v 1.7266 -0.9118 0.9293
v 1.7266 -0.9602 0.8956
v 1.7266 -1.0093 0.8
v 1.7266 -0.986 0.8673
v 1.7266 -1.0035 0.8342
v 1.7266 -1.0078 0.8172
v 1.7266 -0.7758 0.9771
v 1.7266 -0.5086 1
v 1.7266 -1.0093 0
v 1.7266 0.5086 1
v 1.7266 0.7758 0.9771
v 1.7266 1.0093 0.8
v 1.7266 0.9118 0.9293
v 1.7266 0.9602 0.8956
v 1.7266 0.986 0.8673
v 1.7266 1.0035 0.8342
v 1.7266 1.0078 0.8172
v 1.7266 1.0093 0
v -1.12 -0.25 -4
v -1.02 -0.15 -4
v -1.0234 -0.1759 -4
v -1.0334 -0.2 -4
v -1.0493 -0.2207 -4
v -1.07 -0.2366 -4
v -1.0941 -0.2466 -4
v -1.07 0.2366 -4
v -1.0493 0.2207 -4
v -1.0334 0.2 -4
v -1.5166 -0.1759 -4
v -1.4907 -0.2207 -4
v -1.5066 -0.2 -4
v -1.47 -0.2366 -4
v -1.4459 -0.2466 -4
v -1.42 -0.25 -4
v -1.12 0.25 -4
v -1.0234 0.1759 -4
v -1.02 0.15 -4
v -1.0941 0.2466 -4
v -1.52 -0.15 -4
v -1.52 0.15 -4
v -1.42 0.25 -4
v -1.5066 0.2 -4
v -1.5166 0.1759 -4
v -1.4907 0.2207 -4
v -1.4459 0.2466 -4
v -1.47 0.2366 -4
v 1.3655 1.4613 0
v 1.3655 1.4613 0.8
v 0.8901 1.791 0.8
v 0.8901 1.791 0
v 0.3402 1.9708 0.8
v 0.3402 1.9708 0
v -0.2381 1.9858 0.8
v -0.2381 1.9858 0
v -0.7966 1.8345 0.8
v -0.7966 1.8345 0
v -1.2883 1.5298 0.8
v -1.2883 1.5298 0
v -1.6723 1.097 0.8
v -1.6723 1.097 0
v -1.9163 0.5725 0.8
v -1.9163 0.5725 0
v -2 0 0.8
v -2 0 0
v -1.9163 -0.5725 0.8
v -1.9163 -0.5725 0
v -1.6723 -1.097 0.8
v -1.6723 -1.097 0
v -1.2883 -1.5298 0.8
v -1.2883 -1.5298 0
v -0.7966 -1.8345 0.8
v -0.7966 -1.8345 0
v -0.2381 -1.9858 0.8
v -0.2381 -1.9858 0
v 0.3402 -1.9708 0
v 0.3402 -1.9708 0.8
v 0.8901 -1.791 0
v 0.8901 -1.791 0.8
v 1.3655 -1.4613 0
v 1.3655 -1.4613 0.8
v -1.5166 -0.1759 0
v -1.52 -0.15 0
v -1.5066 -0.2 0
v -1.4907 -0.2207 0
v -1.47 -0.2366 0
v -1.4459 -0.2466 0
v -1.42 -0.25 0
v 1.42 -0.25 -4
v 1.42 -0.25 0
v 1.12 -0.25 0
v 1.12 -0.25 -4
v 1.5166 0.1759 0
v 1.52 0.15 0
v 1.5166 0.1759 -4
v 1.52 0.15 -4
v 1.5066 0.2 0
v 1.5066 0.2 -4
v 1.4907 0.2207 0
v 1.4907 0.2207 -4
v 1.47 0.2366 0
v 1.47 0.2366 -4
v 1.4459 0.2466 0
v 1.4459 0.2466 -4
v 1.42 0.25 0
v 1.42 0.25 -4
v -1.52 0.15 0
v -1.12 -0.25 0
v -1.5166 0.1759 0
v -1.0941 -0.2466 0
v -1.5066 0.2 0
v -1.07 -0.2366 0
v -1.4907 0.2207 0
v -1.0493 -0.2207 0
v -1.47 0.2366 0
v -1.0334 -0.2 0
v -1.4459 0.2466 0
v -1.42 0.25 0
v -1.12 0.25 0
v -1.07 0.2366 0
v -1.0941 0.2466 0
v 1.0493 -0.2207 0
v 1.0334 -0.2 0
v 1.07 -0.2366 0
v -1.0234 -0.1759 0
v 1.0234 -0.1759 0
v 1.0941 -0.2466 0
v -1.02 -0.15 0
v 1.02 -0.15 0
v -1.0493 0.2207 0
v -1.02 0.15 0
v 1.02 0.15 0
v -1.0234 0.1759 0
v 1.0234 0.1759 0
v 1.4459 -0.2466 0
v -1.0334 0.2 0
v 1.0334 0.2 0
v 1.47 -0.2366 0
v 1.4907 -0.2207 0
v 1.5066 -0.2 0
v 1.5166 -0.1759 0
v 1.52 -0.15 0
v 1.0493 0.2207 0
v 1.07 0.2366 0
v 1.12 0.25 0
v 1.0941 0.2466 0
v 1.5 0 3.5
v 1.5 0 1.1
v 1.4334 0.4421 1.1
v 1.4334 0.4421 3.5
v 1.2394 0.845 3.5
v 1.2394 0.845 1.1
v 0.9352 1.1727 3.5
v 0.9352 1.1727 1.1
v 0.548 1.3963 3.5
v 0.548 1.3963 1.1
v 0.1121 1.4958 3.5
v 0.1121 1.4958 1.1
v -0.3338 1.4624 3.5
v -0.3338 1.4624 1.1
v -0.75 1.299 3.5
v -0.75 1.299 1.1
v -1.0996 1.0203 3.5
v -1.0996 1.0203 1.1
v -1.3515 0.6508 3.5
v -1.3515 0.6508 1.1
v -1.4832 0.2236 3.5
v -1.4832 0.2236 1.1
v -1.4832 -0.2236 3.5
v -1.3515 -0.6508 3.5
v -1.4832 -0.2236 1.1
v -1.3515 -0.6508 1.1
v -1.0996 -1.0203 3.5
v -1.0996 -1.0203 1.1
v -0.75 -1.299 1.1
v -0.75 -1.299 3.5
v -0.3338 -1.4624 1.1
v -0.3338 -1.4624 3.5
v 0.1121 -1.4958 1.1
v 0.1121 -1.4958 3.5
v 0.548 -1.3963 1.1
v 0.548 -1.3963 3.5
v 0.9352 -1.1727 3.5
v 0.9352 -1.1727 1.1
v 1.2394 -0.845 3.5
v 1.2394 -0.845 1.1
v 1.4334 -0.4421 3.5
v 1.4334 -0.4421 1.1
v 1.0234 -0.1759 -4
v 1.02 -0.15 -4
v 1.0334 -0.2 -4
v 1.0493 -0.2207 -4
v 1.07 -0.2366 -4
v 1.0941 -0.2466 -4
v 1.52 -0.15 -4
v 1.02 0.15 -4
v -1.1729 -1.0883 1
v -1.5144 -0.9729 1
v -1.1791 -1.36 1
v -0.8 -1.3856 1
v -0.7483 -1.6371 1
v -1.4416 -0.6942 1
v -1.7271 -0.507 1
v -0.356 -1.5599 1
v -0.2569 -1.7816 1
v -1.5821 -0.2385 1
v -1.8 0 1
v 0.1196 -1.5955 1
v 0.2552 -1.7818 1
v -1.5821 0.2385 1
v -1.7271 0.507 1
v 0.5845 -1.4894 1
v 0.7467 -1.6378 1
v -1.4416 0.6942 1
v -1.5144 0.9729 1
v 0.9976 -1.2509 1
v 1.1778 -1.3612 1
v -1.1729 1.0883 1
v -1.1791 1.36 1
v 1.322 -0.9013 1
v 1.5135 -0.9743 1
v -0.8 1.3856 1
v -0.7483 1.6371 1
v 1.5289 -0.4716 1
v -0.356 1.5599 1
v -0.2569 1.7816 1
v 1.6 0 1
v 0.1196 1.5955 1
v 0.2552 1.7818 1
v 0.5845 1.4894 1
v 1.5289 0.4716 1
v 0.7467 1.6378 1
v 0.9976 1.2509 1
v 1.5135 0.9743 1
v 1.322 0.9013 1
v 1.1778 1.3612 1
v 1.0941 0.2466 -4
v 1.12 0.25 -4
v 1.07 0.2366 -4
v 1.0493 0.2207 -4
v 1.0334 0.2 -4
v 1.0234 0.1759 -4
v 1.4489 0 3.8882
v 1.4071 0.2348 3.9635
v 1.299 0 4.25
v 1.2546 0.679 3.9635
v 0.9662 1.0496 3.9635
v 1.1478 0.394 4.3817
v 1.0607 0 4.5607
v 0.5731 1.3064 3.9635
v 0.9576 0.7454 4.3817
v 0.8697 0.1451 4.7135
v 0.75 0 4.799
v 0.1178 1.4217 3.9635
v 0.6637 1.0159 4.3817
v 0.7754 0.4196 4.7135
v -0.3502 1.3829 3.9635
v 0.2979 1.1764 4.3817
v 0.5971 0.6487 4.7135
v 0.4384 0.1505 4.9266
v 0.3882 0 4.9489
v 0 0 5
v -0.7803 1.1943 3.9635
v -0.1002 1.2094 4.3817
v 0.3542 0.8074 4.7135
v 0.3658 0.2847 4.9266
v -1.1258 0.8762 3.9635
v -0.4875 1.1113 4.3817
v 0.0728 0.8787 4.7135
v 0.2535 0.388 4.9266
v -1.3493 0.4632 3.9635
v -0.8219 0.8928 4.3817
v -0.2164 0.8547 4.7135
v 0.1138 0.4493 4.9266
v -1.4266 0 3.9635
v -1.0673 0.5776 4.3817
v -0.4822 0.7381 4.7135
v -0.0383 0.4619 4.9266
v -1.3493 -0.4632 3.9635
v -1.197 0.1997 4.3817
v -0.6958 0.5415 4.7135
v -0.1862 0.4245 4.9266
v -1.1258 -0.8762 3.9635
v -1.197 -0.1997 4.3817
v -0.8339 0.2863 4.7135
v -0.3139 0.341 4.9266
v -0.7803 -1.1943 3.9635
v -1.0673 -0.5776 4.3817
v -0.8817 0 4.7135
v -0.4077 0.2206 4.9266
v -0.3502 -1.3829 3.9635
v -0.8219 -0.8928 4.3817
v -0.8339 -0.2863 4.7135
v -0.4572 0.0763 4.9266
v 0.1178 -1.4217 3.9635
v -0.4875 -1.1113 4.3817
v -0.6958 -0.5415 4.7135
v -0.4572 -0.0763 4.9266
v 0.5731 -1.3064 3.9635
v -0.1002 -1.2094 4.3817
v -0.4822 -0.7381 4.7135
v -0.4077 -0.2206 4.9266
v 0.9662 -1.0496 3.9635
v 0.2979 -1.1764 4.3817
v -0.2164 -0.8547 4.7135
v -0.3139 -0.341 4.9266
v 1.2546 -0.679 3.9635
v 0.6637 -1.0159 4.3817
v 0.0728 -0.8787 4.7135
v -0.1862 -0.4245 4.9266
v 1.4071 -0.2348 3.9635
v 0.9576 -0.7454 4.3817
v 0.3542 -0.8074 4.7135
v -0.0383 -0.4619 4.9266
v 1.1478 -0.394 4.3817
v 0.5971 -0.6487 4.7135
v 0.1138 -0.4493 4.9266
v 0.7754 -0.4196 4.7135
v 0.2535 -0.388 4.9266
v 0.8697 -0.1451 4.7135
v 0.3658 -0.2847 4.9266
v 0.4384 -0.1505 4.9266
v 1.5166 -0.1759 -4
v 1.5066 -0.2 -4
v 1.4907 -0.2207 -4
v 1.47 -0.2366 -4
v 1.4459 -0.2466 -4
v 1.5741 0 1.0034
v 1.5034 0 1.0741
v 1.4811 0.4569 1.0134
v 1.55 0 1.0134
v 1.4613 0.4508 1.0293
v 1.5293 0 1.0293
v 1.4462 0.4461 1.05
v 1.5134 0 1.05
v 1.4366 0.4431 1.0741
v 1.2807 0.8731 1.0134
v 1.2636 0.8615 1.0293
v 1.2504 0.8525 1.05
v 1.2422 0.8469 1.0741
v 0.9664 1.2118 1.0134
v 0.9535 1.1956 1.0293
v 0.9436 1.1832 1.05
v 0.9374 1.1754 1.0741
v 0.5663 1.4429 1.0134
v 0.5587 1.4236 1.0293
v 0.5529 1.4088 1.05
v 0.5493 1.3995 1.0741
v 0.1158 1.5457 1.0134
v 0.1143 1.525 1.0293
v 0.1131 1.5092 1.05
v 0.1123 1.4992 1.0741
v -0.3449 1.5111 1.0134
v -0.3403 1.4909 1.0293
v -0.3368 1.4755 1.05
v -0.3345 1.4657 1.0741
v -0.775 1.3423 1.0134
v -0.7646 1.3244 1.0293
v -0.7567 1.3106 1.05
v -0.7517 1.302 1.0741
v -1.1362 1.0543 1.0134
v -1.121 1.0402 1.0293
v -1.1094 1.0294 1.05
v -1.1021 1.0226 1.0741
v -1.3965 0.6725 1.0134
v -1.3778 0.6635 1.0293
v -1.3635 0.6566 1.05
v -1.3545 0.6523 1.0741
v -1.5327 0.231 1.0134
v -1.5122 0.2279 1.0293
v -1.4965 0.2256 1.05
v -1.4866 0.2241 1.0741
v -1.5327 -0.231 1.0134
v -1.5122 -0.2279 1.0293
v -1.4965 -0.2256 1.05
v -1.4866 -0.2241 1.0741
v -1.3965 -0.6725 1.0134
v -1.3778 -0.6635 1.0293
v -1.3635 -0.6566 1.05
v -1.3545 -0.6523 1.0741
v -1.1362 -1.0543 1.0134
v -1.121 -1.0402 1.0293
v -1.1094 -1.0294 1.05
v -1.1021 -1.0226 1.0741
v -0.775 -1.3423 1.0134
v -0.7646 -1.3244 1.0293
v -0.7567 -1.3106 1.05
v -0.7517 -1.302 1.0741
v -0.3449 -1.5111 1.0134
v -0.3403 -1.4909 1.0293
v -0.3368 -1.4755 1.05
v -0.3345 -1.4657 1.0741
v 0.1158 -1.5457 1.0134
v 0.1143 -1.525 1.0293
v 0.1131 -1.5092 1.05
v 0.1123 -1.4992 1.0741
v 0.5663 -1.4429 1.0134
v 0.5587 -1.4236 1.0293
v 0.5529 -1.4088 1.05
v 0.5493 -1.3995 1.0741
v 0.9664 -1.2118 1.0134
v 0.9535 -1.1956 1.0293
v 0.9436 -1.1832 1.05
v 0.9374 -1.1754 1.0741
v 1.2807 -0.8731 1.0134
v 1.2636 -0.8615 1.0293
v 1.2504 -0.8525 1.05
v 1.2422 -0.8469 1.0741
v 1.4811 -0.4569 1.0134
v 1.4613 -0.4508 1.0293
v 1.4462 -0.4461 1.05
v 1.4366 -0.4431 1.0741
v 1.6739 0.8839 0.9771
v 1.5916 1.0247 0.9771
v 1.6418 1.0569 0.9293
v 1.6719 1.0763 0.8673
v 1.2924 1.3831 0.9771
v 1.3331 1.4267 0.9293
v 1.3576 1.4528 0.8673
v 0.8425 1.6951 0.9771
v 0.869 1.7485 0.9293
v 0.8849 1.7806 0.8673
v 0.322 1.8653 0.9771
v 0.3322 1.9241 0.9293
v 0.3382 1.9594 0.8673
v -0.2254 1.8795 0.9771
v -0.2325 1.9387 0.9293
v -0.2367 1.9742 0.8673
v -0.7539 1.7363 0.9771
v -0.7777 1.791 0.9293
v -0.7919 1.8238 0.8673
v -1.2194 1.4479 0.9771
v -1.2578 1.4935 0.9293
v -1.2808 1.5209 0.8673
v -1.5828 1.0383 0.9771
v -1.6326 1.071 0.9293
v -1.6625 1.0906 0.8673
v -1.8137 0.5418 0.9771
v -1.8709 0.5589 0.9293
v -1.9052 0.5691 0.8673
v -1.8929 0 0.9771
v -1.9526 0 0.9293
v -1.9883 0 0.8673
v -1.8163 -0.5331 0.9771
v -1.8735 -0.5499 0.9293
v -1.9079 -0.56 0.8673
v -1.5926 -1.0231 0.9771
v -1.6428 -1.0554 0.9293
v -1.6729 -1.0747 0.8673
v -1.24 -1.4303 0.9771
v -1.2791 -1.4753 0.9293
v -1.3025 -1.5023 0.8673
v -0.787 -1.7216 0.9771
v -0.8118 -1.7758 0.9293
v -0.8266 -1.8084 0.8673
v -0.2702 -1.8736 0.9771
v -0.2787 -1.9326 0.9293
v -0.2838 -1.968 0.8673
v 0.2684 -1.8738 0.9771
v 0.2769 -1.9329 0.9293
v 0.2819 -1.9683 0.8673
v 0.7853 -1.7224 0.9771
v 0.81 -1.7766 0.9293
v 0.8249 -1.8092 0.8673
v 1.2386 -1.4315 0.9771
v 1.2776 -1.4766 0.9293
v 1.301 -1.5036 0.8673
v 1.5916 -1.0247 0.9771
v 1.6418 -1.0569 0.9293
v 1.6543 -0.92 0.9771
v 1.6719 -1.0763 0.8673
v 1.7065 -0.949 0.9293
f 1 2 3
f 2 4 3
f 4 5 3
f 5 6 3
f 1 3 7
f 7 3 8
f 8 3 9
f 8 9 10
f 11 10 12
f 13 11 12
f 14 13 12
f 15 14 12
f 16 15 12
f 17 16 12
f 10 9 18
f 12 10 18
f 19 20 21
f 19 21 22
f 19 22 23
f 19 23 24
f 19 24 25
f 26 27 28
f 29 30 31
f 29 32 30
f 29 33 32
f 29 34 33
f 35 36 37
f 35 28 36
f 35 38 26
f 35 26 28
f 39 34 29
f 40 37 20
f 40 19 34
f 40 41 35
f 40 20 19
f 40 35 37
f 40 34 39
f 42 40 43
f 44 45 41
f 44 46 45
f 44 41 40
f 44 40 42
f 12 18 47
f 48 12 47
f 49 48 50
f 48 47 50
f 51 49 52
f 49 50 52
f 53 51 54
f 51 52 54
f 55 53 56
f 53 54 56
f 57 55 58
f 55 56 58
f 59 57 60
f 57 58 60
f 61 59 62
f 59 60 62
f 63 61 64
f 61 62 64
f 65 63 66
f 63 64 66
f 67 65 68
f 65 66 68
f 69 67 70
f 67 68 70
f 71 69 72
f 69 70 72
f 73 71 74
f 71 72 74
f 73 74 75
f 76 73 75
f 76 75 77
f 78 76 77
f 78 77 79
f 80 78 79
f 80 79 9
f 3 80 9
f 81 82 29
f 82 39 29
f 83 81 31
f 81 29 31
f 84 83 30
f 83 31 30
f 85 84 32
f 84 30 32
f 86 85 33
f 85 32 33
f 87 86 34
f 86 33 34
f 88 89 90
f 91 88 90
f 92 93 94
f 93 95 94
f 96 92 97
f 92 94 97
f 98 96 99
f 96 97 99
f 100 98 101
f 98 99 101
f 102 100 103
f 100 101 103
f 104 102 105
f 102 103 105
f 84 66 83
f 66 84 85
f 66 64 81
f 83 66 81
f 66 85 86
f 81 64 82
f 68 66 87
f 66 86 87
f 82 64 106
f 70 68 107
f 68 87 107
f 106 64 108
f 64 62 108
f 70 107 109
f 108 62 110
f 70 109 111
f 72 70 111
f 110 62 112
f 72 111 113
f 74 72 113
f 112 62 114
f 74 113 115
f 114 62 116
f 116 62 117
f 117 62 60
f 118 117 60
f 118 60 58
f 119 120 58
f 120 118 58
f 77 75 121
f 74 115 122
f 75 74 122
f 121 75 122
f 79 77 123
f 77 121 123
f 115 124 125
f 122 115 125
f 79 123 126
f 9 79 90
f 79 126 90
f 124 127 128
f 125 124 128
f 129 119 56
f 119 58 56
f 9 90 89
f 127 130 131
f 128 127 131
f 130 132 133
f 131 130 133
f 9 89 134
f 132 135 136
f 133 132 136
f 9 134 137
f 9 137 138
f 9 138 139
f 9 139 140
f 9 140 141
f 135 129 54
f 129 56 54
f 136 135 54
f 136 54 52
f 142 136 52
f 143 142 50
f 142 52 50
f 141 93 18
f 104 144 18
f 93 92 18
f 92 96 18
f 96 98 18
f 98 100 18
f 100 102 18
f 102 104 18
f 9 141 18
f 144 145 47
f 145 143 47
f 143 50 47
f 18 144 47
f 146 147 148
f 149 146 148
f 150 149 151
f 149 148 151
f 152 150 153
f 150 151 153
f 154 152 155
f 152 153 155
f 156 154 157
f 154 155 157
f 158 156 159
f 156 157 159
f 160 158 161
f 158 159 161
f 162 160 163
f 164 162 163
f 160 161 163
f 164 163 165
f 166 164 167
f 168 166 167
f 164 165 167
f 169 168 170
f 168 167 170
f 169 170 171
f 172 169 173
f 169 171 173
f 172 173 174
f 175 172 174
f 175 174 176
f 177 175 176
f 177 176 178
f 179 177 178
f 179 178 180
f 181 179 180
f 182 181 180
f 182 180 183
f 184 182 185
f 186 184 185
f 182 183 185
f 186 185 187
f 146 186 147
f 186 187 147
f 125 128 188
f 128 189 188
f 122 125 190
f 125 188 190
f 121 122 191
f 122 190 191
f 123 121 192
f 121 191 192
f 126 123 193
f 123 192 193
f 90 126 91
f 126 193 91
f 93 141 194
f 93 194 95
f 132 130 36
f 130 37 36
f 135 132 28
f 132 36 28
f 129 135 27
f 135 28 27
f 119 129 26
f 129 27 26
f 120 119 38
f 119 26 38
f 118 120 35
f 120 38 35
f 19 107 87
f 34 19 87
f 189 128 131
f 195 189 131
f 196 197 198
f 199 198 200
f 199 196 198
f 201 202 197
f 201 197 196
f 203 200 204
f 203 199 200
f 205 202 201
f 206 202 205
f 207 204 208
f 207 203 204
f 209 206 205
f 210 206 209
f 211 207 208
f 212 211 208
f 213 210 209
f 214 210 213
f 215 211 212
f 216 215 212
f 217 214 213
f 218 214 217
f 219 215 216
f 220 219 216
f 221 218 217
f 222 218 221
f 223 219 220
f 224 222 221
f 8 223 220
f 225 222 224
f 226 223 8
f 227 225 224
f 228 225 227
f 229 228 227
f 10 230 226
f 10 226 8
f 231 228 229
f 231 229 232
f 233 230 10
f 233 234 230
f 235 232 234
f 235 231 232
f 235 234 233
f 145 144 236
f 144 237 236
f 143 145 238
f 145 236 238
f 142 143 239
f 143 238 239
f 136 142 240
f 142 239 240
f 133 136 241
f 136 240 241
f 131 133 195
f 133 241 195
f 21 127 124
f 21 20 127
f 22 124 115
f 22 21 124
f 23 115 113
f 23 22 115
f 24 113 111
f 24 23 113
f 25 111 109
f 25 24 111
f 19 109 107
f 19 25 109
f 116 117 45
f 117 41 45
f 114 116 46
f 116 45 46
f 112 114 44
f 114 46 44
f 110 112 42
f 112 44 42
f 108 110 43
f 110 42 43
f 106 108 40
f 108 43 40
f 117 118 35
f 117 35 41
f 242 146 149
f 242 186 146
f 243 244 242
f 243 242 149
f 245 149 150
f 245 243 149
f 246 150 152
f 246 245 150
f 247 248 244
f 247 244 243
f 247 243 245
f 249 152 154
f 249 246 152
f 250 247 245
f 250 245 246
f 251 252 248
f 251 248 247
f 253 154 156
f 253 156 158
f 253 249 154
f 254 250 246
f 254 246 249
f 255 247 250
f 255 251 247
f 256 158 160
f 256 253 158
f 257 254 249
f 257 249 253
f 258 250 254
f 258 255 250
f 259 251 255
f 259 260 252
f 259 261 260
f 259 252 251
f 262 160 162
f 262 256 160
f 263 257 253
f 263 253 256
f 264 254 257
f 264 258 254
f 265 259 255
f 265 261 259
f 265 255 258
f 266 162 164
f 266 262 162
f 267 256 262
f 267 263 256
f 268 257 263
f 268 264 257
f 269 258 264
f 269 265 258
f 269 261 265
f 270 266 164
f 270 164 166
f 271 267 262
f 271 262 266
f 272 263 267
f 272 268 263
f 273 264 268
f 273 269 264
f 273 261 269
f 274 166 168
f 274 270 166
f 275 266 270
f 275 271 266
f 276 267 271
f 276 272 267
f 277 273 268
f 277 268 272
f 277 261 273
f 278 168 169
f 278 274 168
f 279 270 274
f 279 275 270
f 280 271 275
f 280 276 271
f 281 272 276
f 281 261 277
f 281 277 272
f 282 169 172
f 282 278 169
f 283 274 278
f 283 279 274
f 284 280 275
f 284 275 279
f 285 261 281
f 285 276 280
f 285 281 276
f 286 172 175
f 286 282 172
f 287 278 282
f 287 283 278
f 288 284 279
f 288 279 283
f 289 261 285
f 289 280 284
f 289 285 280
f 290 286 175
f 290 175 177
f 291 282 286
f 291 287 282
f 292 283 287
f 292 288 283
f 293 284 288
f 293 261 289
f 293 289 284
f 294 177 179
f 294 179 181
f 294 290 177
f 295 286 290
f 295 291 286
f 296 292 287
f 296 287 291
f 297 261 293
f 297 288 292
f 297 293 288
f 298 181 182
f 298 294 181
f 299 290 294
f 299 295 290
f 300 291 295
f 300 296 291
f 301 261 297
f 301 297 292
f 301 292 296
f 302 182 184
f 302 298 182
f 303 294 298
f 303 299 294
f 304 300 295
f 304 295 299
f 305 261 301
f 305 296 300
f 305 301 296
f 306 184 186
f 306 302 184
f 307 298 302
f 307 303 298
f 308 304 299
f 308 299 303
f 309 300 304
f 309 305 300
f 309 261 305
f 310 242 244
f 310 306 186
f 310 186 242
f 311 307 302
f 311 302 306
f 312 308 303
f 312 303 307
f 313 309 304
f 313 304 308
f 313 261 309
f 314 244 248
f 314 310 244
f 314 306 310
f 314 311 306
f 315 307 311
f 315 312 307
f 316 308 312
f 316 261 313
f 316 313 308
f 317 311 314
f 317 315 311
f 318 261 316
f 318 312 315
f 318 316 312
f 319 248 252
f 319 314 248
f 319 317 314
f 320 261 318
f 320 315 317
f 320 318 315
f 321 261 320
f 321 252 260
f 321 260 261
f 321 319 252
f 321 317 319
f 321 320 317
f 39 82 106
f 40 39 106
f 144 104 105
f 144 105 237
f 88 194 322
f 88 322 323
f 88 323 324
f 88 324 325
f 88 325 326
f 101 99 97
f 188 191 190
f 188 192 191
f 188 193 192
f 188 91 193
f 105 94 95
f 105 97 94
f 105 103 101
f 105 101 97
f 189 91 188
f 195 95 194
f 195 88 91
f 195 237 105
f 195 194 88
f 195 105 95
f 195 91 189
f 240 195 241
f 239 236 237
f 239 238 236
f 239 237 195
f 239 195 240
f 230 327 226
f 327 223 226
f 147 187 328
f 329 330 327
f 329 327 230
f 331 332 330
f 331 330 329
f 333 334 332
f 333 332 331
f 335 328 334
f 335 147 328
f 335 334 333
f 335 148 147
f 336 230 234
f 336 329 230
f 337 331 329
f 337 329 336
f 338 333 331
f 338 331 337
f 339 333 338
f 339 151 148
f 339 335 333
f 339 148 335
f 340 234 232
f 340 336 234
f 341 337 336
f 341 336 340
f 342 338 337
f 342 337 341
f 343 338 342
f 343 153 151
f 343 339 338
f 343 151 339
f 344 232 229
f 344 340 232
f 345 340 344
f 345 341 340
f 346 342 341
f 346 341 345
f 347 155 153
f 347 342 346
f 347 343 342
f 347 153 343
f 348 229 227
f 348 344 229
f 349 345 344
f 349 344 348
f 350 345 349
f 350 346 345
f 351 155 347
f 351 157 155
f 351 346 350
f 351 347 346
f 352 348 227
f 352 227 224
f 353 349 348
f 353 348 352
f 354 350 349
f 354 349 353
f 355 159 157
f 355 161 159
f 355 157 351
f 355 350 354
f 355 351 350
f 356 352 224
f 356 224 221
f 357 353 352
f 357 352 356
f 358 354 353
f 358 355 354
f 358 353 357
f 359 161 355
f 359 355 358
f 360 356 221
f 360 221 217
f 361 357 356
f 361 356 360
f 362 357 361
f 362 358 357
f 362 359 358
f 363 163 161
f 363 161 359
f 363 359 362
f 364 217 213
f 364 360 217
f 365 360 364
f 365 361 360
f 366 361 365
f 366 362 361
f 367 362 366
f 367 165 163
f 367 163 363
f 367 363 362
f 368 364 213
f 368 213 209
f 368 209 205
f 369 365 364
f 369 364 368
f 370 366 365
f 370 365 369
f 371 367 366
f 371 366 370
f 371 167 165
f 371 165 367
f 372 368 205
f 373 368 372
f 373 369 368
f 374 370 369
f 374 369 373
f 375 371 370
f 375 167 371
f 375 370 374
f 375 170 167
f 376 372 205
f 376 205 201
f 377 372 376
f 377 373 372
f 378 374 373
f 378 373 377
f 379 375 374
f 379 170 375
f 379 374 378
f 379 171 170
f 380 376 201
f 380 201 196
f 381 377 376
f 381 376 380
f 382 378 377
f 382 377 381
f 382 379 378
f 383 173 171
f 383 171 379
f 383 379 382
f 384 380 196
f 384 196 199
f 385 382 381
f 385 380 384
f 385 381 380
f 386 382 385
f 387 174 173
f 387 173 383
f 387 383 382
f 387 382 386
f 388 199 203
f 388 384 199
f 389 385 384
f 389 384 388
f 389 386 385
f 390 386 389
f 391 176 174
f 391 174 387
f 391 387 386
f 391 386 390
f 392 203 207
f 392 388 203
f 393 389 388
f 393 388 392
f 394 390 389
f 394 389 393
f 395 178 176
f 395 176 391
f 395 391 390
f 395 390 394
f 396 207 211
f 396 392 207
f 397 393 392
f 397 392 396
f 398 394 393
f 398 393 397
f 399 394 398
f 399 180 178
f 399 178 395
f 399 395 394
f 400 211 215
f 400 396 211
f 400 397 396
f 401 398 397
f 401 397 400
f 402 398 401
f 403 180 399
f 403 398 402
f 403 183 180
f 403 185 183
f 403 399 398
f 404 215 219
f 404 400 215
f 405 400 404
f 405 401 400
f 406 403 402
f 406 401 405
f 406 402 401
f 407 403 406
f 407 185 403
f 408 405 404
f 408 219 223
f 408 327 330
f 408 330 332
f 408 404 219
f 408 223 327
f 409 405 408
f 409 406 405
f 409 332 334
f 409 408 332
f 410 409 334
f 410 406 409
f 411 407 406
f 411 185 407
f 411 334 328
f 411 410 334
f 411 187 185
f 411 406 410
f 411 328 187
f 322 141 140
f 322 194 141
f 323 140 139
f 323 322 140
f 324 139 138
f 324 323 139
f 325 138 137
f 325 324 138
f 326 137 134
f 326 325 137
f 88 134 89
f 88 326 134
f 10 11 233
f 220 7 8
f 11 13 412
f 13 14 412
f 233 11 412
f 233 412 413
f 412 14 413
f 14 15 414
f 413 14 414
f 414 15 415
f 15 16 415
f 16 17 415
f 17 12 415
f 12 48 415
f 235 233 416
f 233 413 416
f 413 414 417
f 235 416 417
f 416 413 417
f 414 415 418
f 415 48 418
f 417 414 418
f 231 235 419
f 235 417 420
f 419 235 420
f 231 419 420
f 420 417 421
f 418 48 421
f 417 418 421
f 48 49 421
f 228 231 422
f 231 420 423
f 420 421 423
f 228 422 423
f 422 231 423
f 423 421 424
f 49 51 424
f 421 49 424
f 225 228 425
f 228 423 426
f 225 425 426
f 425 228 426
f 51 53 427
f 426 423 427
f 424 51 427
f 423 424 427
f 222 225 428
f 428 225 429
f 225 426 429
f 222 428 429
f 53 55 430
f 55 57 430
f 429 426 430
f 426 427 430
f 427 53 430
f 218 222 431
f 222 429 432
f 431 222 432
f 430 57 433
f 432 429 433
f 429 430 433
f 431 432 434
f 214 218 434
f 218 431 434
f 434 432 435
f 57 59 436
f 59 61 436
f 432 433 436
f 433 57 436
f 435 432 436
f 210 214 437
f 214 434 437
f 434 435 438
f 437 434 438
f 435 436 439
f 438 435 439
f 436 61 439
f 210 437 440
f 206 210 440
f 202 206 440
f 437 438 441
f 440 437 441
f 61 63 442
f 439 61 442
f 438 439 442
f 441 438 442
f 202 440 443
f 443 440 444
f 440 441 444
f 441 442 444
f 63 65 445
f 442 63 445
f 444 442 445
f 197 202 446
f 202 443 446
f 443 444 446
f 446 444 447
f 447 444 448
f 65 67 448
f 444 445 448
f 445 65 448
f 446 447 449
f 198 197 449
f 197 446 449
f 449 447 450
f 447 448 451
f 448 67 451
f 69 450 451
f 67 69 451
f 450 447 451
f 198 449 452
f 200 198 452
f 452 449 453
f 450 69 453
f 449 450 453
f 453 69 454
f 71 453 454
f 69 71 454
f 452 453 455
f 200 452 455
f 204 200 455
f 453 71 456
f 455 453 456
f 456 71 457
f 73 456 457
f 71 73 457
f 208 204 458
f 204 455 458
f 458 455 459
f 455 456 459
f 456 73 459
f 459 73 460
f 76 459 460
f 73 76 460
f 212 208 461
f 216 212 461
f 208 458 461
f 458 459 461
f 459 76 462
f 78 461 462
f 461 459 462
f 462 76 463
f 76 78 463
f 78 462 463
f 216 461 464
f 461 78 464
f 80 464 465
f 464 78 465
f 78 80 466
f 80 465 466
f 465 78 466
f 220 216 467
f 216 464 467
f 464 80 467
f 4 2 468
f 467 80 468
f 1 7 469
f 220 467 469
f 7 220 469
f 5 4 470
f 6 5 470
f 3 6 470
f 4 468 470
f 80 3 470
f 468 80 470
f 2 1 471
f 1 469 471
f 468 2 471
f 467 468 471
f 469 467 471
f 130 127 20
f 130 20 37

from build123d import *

# Parameters (mm, degrees)
SKETCH1_R           = 2
BOSS_EXTRUDE1_DEPTH = 1
SKETCH2_R           = 1.5
BOSS_EXTRUDE2_DEPTH = 4
FILLET1_R           = 1.5
SKETCH3_W           = 0.5
SKETCH3_H           = 0.5
BOSS_EXTRUDE3_DEPTH = 4
FILLET2_R           = 0.2
FILLET3_R           = 0.1
FILLET4_R           = 0.1
CUT_EXTRUDE1_DEPTH  = 6


with BuildPart() as part:
    # Sketch1 → Boss-Extrude1 (new body)
    with BuildSketch(Plane.XY):
        Circle(SKETCH1_R)
    extrude(amount=BOSS_EXTRUDE1_DEPTH)

    # Sketch2 → Boss-Extrude2 (add)
    with BuildSketch(Plane.XY.offset(1)):
        Circle(SKETCH2_R)
    extrude(amount=BOSS_EXTRUDE2_DEPTH)

    # Fillet1
    fillet1_edges = [part.edges().sort_by_distance(p)[0] for p in [
        (-1.5, 0, 5),
    ]]
    fillet(fillet1_edges, radius=FILLET1_R)

    # Sketch3 → Boss-Extrude3 (add)
    with BuildSketch(Plane(origin=(0, 0, 0), x_dir=(-1, 0, 0), z_dir=(0, 0, -1))):
        with Locations((-1.27, 0)):
            Rectangle(SKETCH3_W, SKETCH3_H)
        with Locations((1.27, 0)):
            Rectangle(SKETCH3_W, SKETCH3_H)
    extrude(amount=BOSS_EXTRUDE3_DEPTH)

    # Fillet2
    fillet2_edges = [part.edges().sort_by_distance(p)[0] for p in [
        (-2, 0, 1),
    ]]
    fillet(fillet2_edges, radius=FILLET2_R)

    # Fillet3
    fillet3_edges = [part.edges().sort_by_distance(p)[0] for p in [
        (-1.5, 0, 1),
    ]]
    fillet(fillet3_edges, radius=FILLET3_R)

    # Fillet4
    fillet4_edges = [part.edges().sort_by_distance(p)[0] for p in [
        (1.02, -0.25, -2),
        (1.02, 0.25, -2),
        (1.52, 0.25, -2),
        (1.52, -0.25, -2),
        (-1.52, -0.25, -2),
        (-1.52, 0.25, -2),
        (-1.02, 0.25, -2),
        (-1.02, -0.25, -2),
    ]]
    fillet(fillet4_edges, radius=FILLET4_R)

    # Sketch5 → Cut-Extrude1 (cut, through all)
    with BuildSketch(Plane(origin=(0, 0, 0), x_dir=(-1, 0, 0), z_dir=(0, 0, -1))):
        with BuildLine():
            Line((-1.726643001, -1.009308647), (-1.726643001, 1.009308647))
            ThreePointArc((-1.726643001, 1.009308647), (-2, 0), (-1.726643001, -1.009308647))
        make_face()
    extrude(amount=-CUT_EXTRUDE1_DEPTH, mode=Mode.SUBTRACT)


solid = part.part
